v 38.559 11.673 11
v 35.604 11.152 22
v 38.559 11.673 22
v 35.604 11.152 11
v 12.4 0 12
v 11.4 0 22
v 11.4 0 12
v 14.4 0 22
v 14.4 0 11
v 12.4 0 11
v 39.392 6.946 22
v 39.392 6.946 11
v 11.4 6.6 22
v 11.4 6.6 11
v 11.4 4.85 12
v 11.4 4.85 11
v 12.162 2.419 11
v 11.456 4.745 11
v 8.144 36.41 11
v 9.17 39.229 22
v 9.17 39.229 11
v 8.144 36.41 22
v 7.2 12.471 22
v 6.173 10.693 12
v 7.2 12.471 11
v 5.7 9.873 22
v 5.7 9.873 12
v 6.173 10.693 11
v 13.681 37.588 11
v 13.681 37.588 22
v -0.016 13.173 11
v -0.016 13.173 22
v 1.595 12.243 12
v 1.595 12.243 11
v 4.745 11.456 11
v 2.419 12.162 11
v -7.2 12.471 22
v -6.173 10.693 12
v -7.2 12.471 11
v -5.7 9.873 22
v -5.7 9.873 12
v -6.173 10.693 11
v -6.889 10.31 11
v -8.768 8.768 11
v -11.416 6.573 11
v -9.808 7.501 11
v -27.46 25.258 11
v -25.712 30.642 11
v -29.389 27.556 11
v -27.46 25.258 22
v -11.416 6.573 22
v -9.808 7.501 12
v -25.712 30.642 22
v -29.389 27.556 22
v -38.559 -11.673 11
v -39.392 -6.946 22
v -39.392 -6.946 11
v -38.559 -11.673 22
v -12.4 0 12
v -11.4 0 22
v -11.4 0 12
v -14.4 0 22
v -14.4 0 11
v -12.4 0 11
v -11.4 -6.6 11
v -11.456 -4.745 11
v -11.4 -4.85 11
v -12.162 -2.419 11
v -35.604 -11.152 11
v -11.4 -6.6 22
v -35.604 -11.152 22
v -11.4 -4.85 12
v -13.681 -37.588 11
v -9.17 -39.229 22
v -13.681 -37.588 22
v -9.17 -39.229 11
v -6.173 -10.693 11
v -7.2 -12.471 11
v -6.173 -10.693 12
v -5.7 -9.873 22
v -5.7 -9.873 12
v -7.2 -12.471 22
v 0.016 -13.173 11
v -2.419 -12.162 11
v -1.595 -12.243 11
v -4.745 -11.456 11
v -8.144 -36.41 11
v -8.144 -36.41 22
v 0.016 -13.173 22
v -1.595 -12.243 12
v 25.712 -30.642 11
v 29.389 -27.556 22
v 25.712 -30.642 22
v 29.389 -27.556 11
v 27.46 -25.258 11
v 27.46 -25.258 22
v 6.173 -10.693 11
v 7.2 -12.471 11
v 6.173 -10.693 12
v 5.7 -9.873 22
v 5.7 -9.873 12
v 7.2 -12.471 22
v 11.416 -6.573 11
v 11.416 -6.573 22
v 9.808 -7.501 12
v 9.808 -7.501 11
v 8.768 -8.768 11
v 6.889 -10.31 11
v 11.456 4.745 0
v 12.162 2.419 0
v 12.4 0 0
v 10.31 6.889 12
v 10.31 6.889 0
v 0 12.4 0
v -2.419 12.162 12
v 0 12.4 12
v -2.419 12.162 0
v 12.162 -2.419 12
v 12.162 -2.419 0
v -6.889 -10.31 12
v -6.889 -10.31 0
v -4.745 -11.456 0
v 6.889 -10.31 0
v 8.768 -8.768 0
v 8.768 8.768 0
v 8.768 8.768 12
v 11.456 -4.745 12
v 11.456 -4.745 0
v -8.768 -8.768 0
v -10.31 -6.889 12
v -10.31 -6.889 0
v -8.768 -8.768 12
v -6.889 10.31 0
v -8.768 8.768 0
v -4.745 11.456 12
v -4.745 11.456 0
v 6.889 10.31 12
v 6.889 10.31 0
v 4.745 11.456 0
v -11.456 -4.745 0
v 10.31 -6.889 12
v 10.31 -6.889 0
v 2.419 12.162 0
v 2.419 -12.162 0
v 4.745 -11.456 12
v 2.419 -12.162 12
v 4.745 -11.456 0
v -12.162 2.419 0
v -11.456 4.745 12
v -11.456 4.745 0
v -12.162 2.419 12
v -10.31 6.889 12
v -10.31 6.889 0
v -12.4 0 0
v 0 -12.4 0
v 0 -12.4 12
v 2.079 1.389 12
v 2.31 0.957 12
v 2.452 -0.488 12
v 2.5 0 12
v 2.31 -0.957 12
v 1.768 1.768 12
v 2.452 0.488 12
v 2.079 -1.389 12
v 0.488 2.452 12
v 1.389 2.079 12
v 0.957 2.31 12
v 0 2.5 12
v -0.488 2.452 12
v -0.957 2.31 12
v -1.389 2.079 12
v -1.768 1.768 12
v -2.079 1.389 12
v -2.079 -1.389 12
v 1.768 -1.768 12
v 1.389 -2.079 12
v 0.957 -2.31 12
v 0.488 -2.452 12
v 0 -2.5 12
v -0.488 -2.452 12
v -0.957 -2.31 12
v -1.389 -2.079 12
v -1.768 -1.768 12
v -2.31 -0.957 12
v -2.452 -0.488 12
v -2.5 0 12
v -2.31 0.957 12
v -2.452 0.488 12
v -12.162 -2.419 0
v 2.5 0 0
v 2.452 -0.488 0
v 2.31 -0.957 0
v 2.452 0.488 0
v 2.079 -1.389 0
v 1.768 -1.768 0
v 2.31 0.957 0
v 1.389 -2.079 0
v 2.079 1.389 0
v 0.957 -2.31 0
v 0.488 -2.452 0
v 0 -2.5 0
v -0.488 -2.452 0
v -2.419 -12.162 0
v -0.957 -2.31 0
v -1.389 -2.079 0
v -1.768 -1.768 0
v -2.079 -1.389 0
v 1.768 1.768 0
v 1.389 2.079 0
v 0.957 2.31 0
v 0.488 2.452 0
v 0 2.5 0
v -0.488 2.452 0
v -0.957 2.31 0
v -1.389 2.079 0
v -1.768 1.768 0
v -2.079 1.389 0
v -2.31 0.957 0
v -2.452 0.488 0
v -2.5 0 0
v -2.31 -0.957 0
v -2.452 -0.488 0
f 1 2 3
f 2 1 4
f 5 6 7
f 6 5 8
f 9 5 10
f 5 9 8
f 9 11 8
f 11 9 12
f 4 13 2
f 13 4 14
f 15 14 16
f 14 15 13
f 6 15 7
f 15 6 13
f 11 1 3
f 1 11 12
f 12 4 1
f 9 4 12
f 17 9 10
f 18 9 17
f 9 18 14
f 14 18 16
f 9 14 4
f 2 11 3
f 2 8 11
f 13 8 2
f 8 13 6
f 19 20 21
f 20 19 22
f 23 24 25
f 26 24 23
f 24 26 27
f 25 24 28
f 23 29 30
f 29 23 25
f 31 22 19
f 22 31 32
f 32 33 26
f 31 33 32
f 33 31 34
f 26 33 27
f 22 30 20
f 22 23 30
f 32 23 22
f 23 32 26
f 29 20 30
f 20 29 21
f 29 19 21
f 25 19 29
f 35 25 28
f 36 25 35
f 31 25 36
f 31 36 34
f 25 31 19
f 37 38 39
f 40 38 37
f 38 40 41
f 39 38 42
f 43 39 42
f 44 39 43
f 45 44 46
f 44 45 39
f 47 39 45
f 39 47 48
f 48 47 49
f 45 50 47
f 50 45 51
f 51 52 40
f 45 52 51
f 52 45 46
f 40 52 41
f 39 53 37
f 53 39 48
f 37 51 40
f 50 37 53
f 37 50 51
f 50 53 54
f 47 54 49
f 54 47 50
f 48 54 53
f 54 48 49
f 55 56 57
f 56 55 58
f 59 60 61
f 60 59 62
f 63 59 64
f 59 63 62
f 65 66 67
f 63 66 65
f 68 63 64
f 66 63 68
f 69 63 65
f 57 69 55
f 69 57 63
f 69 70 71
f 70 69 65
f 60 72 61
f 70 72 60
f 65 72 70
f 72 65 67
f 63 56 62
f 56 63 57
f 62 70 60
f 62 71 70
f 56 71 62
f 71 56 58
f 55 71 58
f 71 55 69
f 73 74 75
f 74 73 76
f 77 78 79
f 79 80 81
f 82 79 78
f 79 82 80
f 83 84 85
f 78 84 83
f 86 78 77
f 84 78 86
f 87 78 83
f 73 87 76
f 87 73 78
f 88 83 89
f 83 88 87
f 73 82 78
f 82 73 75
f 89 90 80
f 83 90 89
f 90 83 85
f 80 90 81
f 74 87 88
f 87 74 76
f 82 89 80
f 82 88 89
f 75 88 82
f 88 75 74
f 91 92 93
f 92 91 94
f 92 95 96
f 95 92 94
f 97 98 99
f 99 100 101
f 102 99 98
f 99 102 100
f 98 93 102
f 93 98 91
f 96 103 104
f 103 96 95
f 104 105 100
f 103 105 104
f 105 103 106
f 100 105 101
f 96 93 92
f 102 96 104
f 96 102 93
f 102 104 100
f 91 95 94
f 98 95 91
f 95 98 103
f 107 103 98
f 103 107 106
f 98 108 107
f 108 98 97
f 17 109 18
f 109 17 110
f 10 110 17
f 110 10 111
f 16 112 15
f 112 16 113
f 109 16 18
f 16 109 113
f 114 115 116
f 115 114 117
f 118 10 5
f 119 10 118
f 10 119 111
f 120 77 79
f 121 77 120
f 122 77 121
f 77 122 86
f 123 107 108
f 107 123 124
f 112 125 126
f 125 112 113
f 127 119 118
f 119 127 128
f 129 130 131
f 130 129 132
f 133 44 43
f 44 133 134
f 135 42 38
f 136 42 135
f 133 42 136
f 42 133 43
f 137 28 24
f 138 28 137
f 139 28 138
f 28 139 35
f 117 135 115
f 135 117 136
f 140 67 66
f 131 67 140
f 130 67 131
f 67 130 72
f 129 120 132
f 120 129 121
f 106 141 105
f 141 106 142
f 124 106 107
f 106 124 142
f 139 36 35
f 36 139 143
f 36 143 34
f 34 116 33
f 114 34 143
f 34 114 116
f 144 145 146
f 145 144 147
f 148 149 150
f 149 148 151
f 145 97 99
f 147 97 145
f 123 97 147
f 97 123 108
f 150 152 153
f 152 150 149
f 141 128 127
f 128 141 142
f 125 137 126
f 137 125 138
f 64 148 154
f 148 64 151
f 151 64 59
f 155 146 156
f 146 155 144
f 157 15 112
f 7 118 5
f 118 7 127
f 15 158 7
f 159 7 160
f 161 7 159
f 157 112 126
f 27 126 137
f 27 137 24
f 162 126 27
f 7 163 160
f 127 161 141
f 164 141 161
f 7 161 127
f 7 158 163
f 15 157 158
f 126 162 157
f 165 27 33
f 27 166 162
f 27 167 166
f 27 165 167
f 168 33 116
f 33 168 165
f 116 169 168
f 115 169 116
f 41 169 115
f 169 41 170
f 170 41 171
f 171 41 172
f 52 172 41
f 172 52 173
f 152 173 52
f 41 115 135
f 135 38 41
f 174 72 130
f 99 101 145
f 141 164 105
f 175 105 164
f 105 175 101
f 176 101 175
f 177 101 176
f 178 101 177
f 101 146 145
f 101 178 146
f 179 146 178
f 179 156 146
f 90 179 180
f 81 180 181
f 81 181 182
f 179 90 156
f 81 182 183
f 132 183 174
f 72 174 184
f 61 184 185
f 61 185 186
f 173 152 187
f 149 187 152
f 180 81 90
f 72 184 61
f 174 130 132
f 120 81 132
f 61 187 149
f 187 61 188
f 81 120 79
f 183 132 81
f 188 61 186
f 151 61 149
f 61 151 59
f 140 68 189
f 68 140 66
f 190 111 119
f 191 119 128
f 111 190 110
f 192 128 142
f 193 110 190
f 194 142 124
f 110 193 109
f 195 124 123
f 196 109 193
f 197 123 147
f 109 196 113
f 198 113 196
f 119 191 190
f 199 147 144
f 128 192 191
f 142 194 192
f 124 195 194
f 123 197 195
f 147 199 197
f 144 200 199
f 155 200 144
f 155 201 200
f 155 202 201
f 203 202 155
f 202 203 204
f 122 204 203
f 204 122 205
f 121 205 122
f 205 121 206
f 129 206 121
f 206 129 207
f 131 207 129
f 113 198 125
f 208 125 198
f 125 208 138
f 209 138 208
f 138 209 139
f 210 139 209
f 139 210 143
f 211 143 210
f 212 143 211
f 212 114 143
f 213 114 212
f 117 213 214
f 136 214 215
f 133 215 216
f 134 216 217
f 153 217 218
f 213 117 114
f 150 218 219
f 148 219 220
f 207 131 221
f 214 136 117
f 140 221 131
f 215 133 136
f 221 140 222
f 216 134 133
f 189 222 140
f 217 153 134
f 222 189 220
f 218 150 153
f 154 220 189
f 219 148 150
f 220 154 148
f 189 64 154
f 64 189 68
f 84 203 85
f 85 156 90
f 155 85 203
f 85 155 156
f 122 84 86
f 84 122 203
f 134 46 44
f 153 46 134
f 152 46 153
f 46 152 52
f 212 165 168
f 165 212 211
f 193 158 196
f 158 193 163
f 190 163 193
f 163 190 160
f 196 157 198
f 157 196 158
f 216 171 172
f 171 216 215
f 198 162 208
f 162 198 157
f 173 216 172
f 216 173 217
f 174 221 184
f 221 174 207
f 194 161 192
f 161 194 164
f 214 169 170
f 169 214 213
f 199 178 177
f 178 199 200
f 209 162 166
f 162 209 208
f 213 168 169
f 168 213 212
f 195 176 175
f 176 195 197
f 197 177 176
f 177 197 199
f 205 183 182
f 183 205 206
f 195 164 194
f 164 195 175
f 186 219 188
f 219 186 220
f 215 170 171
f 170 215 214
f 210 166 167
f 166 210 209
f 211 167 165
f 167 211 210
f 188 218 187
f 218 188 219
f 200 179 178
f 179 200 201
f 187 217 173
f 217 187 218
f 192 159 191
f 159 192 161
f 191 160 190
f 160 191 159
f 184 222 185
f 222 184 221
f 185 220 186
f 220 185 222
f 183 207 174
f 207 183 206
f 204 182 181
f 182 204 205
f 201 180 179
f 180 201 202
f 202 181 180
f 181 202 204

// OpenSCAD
$fn = 32;

// ----------------------------------------------------------------------
// Impeller: 80 mm, 6 blades, 22 mm tall
// ----------------------------------------------------------------------

// --- parameters (mm) ---
center_d = 24.8;          // hub diameter
center_h = 12;            // hub height
wheel_d = 80;             // outer diameter over the blades
blade_count = 6;          // number of blades
blade_t = 3;              // blade thickness
blade_h = 10;             // blade height
blade_in_r = 11.4;        // blade root radius
blade_out_r = 37;         // blade tip radius
sweep = 10;               // blade sweep, degrees
bore_d = 5;               // shaft bore

module hub() {
  cylinder(h = center_h, d = center_d);
}

module blade() {
  /* blade swept between two boxes: hull of the root and the tip section */
  hull() {
    translate([blade_in_r, 0, center_h - 1])
      cube([blade_t, blade_t * 2.2, blade_h + 1], center = false);
    rotate([0, 0, sweep])
      translate([blade_out_r, 0, center_h - 1])
        cube([blade_t, blade_t * 1.6, blade_h + 1], center = false);
  }
}

module blades() {
  for (i = [0 : blade_count - 1])
    rotate([0, 0, i * 360 / blade_count]) blade();
}

difference() {
  union() {
    hub();
    blades();
  }
  translate([0, 0, -1]) cylinder(h = center_h + blade_h + 0 + 3, d = bore_d);
}
